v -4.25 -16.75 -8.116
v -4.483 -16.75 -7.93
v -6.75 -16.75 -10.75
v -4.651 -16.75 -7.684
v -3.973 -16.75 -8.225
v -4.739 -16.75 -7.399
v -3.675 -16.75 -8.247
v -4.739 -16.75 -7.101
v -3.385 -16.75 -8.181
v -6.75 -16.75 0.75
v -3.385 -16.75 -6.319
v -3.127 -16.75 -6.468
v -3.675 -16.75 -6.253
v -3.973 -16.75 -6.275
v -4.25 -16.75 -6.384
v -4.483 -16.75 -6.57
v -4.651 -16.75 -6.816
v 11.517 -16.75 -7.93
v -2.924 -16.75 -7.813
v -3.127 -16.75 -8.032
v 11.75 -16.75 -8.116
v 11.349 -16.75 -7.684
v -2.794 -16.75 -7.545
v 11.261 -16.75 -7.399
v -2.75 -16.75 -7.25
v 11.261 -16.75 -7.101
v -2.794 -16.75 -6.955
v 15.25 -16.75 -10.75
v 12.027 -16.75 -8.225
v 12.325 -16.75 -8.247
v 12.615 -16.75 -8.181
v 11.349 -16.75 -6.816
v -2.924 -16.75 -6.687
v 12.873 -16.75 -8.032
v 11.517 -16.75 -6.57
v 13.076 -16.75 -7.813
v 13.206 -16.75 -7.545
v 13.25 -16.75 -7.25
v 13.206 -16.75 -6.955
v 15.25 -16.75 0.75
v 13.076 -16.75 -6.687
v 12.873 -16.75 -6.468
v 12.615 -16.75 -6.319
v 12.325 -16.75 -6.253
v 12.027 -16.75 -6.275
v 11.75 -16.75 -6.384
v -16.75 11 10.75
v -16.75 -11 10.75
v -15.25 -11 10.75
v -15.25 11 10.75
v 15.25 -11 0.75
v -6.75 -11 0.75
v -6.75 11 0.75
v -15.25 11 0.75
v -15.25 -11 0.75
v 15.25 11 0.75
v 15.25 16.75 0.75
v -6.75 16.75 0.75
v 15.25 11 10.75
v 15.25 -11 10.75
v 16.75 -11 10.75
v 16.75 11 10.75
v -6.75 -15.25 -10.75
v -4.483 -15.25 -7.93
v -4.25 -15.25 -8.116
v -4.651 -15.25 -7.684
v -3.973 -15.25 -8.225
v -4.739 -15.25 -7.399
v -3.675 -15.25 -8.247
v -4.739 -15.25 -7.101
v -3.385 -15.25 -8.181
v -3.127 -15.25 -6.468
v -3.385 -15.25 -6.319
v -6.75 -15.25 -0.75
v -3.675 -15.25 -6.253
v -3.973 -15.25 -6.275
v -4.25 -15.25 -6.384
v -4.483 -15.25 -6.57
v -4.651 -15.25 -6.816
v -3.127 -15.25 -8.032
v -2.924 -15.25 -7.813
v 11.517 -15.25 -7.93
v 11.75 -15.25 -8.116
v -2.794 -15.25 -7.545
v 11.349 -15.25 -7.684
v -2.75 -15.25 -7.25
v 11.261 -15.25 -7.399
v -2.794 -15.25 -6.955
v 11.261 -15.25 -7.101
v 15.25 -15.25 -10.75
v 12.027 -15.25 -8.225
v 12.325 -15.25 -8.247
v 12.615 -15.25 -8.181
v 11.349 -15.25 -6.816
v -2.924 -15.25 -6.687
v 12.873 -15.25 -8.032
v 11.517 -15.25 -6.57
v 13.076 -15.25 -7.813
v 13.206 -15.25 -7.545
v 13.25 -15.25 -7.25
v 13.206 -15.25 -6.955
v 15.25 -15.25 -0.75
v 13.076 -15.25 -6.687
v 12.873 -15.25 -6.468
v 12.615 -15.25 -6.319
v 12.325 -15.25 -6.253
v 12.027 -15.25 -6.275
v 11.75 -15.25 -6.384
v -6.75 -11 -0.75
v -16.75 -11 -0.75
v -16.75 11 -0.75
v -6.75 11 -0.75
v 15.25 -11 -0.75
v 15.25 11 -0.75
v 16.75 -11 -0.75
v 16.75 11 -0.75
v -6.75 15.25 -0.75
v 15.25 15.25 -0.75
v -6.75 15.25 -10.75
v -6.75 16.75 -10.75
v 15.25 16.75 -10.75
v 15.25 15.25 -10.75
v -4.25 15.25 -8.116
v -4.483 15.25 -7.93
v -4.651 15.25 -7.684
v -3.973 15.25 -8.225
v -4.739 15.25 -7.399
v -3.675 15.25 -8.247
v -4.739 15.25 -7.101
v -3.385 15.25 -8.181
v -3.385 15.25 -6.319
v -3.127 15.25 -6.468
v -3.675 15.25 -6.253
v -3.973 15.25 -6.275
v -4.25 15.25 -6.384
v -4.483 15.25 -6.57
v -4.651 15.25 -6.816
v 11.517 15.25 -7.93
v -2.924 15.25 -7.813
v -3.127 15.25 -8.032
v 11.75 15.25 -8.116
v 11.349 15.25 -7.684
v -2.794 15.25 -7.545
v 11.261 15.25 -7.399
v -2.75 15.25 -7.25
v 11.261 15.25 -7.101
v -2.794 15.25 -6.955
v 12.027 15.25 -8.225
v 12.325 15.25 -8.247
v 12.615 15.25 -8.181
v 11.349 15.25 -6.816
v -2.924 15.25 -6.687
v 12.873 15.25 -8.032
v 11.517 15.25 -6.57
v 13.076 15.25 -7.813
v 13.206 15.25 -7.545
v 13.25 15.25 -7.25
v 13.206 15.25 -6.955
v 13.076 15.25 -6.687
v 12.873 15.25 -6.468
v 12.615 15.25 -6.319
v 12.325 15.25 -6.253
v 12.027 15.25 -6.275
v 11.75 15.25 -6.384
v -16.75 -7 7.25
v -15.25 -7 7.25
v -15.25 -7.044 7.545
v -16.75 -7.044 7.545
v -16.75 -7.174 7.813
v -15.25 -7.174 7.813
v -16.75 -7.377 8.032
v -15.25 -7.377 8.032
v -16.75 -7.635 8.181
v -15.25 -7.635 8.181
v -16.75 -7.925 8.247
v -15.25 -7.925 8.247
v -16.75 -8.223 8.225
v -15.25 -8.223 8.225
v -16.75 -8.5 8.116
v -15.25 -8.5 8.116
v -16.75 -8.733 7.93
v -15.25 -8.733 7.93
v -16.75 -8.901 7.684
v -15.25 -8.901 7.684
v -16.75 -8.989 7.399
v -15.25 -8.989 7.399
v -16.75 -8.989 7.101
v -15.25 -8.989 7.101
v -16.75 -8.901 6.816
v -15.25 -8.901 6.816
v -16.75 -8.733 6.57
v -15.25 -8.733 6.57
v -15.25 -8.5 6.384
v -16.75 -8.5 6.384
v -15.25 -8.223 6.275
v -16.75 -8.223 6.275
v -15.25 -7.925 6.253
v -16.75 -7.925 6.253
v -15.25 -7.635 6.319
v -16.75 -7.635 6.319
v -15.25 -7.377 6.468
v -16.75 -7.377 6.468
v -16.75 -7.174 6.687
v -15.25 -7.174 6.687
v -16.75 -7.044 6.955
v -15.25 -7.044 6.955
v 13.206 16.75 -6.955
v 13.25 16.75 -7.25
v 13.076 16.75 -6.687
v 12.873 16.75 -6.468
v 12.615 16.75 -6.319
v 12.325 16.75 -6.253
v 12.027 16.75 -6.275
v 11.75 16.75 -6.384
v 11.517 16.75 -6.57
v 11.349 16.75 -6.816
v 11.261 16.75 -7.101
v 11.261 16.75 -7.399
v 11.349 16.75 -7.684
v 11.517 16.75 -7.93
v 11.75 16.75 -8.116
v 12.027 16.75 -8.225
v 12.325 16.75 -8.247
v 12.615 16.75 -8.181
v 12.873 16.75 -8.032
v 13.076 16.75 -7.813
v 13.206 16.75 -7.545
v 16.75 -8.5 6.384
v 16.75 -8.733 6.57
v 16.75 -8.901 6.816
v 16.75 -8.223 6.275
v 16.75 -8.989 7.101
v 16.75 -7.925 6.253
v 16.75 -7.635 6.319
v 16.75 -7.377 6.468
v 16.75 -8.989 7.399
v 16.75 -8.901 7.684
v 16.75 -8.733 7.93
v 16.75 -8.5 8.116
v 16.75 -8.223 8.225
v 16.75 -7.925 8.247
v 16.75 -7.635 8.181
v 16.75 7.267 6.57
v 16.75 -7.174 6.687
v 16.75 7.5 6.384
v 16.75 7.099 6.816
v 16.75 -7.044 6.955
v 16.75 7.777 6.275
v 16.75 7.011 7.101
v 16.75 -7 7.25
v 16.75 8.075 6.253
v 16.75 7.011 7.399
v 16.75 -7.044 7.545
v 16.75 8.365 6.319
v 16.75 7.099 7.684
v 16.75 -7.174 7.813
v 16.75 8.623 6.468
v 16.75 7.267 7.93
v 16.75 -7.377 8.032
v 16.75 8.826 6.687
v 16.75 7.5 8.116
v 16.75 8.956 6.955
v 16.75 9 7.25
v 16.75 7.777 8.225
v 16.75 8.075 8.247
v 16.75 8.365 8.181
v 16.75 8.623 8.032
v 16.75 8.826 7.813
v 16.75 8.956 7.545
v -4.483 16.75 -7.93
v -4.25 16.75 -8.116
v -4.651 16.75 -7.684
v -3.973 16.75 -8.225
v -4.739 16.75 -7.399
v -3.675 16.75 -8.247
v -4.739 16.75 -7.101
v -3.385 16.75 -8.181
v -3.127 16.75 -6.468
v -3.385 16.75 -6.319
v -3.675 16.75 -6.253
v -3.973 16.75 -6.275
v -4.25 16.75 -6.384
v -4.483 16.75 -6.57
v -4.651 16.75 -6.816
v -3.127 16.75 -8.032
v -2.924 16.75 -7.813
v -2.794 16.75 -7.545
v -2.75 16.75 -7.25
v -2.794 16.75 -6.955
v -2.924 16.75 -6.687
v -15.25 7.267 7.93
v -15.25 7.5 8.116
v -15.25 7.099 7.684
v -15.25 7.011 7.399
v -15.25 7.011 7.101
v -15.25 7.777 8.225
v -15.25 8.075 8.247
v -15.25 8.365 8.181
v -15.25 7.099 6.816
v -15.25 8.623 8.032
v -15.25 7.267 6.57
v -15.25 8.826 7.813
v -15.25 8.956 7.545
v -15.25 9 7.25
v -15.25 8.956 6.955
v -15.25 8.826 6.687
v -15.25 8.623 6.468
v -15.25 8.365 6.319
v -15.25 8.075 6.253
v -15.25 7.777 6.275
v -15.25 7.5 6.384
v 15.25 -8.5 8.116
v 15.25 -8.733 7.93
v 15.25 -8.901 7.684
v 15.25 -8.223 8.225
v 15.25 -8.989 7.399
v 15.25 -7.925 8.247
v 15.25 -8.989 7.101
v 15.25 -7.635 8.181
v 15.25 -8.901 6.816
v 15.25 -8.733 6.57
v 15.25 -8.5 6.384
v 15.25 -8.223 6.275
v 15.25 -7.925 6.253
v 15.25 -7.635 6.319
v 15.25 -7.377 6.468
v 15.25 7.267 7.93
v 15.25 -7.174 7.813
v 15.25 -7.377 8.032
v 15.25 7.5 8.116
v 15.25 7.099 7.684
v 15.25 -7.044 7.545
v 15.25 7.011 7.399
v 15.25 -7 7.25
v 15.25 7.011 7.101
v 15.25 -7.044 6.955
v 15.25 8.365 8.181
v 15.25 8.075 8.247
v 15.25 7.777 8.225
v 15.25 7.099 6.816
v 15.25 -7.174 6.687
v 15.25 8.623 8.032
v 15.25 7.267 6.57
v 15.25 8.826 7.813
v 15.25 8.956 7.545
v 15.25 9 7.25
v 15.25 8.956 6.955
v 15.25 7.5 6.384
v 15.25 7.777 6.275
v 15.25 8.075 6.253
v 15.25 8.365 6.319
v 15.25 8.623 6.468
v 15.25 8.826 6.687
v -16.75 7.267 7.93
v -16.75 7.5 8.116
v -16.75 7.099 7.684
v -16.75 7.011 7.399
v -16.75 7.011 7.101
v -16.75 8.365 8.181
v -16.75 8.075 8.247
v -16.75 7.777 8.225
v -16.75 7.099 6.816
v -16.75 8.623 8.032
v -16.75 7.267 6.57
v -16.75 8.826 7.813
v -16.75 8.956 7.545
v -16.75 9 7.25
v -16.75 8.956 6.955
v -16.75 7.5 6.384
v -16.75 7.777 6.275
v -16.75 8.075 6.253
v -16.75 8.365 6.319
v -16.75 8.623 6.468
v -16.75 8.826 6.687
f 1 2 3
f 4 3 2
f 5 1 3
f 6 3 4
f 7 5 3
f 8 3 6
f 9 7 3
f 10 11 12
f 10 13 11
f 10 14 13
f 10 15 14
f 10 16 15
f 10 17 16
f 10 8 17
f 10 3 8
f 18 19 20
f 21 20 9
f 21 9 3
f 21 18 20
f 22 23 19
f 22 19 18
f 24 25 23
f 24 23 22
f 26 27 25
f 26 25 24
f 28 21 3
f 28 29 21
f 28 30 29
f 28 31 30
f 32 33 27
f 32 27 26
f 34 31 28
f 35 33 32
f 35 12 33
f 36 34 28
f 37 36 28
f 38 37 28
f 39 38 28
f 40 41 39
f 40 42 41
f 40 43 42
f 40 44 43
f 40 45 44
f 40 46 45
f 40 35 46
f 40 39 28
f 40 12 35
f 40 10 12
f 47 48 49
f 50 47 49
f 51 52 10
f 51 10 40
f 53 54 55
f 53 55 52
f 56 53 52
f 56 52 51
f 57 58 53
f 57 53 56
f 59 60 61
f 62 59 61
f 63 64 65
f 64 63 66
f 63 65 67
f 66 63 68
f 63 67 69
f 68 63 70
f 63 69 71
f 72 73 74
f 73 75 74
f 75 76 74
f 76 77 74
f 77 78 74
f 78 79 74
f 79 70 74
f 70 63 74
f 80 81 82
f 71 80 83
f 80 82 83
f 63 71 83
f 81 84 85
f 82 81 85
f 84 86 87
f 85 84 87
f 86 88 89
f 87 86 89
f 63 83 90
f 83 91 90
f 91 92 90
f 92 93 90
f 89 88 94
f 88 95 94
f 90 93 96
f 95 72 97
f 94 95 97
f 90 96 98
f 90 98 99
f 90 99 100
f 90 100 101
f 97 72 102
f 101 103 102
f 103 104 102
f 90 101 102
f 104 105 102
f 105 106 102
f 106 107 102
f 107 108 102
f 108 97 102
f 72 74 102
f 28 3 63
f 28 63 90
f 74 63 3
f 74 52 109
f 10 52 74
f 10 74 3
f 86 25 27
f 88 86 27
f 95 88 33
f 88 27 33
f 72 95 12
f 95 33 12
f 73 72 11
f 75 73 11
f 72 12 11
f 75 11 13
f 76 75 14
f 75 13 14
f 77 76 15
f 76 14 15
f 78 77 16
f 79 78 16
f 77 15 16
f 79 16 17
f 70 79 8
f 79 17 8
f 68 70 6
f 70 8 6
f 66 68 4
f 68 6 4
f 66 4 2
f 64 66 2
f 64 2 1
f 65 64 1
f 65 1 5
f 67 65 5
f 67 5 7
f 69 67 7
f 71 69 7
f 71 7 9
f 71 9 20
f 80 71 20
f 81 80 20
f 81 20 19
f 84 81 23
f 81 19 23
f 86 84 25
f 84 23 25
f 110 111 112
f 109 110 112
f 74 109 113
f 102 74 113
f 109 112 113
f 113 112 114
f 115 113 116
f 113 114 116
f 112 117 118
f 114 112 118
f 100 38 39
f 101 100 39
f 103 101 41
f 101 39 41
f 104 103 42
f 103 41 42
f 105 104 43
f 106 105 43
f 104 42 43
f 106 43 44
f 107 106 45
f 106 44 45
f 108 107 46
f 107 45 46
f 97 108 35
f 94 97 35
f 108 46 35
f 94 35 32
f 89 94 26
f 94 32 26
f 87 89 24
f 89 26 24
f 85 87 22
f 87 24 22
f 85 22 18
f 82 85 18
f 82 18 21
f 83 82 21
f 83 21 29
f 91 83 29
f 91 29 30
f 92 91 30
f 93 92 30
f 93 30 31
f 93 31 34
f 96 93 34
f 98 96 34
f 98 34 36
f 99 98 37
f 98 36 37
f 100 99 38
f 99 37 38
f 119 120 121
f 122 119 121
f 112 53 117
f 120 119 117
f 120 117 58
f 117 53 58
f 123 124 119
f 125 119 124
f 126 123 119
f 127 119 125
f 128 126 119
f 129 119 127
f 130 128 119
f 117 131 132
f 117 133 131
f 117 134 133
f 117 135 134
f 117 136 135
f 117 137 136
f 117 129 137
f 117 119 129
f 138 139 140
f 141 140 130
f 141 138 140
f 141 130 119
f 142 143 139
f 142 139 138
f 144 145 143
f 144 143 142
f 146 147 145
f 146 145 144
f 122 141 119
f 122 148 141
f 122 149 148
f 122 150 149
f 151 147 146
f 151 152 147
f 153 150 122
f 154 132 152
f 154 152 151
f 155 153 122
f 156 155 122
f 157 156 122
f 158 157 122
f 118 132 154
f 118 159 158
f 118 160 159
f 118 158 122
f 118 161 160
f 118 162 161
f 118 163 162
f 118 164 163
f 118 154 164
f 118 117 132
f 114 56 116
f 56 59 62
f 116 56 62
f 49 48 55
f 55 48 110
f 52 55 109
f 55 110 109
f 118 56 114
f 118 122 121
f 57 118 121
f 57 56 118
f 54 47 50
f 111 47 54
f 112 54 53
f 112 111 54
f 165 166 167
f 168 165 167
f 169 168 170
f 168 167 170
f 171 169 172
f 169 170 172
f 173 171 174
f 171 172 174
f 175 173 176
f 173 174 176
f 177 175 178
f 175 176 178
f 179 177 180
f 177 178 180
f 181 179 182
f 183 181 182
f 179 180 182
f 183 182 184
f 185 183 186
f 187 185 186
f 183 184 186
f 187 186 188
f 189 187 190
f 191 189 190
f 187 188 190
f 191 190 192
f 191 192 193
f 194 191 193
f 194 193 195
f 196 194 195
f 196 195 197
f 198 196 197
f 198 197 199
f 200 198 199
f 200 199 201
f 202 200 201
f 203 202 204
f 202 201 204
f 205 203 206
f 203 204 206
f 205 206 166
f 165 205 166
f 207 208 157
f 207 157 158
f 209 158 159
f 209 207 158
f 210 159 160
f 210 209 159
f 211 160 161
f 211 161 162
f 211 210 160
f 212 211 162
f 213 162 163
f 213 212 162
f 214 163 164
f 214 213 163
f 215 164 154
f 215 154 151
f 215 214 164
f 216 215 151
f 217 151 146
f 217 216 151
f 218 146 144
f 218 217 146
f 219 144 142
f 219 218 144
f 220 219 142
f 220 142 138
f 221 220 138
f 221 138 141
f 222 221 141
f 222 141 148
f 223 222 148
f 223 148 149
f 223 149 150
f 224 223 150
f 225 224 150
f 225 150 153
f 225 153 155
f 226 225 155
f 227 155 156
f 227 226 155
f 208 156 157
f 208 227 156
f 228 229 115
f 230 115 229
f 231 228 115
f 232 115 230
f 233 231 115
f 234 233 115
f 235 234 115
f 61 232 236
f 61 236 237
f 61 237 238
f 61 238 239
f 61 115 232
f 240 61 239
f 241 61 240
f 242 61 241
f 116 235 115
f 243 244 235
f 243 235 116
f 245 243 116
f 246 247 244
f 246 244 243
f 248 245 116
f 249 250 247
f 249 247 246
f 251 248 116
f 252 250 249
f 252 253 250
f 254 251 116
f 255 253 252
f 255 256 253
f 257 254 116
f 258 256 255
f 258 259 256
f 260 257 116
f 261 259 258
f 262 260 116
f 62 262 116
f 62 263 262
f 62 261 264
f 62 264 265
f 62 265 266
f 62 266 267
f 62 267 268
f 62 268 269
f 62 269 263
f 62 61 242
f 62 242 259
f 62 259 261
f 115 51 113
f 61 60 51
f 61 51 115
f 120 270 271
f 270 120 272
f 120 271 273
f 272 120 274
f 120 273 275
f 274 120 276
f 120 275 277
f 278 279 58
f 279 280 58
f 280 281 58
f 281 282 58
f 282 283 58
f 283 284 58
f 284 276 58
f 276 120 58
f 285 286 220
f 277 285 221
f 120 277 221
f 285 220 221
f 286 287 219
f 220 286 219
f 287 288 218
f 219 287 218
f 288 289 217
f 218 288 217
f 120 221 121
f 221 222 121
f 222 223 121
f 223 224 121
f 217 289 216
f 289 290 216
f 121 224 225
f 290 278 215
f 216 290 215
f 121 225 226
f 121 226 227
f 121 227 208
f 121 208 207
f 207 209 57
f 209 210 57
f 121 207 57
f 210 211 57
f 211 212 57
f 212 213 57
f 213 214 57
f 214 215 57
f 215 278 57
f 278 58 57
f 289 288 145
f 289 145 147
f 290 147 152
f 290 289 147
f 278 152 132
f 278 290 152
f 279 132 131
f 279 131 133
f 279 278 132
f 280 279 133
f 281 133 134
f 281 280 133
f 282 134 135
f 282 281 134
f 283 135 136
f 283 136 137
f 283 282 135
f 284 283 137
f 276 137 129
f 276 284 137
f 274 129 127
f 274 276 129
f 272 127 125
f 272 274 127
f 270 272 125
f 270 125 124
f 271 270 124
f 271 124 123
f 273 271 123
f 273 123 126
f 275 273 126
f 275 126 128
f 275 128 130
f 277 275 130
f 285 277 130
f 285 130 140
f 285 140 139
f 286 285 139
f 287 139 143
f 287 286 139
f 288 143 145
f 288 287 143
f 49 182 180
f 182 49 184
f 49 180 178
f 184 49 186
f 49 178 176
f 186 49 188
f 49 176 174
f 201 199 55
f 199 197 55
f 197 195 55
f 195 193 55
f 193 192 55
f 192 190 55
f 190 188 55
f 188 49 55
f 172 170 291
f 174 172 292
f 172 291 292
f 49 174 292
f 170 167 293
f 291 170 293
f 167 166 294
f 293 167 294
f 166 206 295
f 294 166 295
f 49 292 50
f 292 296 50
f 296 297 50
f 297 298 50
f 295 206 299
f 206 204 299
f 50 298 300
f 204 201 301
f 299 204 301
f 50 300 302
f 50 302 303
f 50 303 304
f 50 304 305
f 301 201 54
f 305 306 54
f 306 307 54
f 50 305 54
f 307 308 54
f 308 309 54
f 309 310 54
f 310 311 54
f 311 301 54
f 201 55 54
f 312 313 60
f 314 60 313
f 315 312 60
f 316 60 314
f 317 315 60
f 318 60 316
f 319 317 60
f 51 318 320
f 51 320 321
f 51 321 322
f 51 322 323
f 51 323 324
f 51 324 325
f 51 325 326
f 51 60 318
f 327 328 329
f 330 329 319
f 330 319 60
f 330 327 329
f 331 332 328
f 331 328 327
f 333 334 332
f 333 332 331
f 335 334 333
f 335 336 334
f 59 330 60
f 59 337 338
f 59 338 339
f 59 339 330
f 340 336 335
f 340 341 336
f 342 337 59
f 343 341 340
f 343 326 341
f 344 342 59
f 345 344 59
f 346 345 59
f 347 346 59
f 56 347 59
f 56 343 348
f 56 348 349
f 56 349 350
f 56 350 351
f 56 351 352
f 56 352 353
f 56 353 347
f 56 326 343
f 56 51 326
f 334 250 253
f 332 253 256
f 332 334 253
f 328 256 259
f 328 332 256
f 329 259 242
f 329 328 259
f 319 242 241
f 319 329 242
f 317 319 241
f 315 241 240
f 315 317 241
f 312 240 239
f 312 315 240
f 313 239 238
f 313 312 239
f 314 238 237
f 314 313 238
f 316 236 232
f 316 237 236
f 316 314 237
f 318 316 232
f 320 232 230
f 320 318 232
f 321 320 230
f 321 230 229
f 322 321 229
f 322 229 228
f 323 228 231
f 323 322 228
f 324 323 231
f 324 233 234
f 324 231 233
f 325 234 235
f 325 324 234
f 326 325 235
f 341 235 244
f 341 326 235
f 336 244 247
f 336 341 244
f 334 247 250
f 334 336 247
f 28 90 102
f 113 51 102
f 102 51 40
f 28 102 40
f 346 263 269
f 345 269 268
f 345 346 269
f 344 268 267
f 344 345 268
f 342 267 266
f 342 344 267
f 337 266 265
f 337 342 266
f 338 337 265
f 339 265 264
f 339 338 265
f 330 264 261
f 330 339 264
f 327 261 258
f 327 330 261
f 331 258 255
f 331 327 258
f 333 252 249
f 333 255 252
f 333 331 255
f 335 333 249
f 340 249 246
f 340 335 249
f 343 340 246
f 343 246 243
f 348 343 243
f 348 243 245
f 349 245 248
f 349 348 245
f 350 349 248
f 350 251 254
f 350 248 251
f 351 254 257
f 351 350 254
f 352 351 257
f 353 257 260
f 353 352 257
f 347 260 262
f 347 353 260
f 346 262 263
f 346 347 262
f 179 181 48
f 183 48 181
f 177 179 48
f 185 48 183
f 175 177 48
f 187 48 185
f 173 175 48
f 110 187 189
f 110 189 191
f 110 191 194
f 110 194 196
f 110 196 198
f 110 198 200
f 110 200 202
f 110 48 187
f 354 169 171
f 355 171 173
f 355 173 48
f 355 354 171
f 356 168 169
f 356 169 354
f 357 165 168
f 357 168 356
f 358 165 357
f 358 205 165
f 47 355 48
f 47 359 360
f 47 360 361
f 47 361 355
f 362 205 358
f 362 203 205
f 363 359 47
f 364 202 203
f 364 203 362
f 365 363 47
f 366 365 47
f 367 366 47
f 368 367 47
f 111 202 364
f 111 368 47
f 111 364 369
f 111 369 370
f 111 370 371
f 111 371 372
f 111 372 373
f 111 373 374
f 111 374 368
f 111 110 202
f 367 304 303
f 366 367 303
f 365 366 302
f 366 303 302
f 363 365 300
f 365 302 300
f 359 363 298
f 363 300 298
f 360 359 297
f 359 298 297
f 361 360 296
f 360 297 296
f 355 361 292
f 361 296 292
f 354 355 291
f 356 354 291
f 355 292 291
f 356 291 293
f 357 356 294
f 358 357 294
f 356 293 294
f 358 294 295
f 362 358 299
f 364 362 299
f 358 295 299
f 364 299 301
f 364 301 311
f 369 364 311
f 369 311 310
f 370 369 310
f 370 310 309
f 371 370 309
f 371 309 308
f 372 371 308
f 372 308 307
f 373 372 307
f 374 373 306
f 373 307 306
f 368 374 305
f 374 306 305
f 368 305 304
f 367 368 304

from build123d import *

# Parameters (mm, degrees)
F0_W          = 10
F0_H          = 22
F0_W_2        = 22
F0_H_2        = 5.75
F0_W_3        = 1.5
F1_DEPTH      = 0.75
F1_DEPTH_BACK = 0.75
F2_W          = 1.5
F2_H          = 22
F3_DEPTH      = 10
F4_W          = 22
F4_H          = 1.5
F5_DEPTH      = 10
F6_R          = 1
F7_DEPTH      = 32.001
F7_DEPTH_BACK = 1.5
F8_R          = 1
F9_DEPTH      = 1.5


with BuildPart() as f1:
    # F0 (on Top) → F1 (new body, two sides)
    with BuildSketch(Plane.XY) as f1_sk:
        with Locations((-11.75, 0)):
            Rectangle(F0_W, F0_H)
        with Locations((4.25, 13.875)):
            Rectangle(F0_W_2, F0_H_2)
        with Locations((4.25, 0)):
            Rectangle(F0_W_2, F0_H)
        with Locations((16, 0)):
            Rectangle(F0_W_3, F0_H)
        with Locations((4.25, -13.875)):
            Rectangle(F0_W_2, F0_H_2)
    extrude(amount=F1_DEPTH)
    extrude(f1_sk.sketch, amount=-F1_DEPTH_BACK)

    # F2 (on face) → F3 (join)
    with BuildSketch(Plane.XY.offset(0.75)):
        with Locations((-16, 0)):
            Rectangle(F2_W, F2_H)
        with Locations((16, 0)):
            Rectangle(F2_W, F2_H)
    extrude(amount=F3_DEPTH)

    # F4 (on face) → F5 (join)
    with BuildSketch(Plane(origin=(0, 0, -0.75), x_dir=(1, 0, 0), z_dir=(0, 0, -1))):
        with Locations((4.25, 16)):
            Rectangle(F4_W, F4_H)
    extrude(amount=F5_DEPTH)

    # F6 (on face) → F7 (cut, two sides)
    with BuildSketch(Plane.YZ.offset(-15.25)) as f7_sk:
        with Locations((-8, 7.25)):
            Circle(F6_R)
        with Locations((8, 7.25)):
            Circle(F6_R)
    extrude(amount=F7_DEPTH, mode=Mode.SUBTRACT)
    extrude(f7_sk.sketch, amount=-F7_DEPTH_BACK, mode=Mode.SUBTRACT)

    # F8 (on face) → F9 (cut, through all)
    with BuildSketch(Plane.XZ.offset(16.75)):
        with Locations((-3.75, -7.25)):
            Circle(F8_R)
        with Locations((12.25, -7.25)):
            Circle(F8_R)
    extrude(amount=-F9_DEPTH, mode=Mode.SUBTRACT)

    # F10: F1 across plane


with BuildPart() as f1_1:
    add(f1.part)
    add(f1.part.mirror(Plane.XZ))


solid = f1_1.part
